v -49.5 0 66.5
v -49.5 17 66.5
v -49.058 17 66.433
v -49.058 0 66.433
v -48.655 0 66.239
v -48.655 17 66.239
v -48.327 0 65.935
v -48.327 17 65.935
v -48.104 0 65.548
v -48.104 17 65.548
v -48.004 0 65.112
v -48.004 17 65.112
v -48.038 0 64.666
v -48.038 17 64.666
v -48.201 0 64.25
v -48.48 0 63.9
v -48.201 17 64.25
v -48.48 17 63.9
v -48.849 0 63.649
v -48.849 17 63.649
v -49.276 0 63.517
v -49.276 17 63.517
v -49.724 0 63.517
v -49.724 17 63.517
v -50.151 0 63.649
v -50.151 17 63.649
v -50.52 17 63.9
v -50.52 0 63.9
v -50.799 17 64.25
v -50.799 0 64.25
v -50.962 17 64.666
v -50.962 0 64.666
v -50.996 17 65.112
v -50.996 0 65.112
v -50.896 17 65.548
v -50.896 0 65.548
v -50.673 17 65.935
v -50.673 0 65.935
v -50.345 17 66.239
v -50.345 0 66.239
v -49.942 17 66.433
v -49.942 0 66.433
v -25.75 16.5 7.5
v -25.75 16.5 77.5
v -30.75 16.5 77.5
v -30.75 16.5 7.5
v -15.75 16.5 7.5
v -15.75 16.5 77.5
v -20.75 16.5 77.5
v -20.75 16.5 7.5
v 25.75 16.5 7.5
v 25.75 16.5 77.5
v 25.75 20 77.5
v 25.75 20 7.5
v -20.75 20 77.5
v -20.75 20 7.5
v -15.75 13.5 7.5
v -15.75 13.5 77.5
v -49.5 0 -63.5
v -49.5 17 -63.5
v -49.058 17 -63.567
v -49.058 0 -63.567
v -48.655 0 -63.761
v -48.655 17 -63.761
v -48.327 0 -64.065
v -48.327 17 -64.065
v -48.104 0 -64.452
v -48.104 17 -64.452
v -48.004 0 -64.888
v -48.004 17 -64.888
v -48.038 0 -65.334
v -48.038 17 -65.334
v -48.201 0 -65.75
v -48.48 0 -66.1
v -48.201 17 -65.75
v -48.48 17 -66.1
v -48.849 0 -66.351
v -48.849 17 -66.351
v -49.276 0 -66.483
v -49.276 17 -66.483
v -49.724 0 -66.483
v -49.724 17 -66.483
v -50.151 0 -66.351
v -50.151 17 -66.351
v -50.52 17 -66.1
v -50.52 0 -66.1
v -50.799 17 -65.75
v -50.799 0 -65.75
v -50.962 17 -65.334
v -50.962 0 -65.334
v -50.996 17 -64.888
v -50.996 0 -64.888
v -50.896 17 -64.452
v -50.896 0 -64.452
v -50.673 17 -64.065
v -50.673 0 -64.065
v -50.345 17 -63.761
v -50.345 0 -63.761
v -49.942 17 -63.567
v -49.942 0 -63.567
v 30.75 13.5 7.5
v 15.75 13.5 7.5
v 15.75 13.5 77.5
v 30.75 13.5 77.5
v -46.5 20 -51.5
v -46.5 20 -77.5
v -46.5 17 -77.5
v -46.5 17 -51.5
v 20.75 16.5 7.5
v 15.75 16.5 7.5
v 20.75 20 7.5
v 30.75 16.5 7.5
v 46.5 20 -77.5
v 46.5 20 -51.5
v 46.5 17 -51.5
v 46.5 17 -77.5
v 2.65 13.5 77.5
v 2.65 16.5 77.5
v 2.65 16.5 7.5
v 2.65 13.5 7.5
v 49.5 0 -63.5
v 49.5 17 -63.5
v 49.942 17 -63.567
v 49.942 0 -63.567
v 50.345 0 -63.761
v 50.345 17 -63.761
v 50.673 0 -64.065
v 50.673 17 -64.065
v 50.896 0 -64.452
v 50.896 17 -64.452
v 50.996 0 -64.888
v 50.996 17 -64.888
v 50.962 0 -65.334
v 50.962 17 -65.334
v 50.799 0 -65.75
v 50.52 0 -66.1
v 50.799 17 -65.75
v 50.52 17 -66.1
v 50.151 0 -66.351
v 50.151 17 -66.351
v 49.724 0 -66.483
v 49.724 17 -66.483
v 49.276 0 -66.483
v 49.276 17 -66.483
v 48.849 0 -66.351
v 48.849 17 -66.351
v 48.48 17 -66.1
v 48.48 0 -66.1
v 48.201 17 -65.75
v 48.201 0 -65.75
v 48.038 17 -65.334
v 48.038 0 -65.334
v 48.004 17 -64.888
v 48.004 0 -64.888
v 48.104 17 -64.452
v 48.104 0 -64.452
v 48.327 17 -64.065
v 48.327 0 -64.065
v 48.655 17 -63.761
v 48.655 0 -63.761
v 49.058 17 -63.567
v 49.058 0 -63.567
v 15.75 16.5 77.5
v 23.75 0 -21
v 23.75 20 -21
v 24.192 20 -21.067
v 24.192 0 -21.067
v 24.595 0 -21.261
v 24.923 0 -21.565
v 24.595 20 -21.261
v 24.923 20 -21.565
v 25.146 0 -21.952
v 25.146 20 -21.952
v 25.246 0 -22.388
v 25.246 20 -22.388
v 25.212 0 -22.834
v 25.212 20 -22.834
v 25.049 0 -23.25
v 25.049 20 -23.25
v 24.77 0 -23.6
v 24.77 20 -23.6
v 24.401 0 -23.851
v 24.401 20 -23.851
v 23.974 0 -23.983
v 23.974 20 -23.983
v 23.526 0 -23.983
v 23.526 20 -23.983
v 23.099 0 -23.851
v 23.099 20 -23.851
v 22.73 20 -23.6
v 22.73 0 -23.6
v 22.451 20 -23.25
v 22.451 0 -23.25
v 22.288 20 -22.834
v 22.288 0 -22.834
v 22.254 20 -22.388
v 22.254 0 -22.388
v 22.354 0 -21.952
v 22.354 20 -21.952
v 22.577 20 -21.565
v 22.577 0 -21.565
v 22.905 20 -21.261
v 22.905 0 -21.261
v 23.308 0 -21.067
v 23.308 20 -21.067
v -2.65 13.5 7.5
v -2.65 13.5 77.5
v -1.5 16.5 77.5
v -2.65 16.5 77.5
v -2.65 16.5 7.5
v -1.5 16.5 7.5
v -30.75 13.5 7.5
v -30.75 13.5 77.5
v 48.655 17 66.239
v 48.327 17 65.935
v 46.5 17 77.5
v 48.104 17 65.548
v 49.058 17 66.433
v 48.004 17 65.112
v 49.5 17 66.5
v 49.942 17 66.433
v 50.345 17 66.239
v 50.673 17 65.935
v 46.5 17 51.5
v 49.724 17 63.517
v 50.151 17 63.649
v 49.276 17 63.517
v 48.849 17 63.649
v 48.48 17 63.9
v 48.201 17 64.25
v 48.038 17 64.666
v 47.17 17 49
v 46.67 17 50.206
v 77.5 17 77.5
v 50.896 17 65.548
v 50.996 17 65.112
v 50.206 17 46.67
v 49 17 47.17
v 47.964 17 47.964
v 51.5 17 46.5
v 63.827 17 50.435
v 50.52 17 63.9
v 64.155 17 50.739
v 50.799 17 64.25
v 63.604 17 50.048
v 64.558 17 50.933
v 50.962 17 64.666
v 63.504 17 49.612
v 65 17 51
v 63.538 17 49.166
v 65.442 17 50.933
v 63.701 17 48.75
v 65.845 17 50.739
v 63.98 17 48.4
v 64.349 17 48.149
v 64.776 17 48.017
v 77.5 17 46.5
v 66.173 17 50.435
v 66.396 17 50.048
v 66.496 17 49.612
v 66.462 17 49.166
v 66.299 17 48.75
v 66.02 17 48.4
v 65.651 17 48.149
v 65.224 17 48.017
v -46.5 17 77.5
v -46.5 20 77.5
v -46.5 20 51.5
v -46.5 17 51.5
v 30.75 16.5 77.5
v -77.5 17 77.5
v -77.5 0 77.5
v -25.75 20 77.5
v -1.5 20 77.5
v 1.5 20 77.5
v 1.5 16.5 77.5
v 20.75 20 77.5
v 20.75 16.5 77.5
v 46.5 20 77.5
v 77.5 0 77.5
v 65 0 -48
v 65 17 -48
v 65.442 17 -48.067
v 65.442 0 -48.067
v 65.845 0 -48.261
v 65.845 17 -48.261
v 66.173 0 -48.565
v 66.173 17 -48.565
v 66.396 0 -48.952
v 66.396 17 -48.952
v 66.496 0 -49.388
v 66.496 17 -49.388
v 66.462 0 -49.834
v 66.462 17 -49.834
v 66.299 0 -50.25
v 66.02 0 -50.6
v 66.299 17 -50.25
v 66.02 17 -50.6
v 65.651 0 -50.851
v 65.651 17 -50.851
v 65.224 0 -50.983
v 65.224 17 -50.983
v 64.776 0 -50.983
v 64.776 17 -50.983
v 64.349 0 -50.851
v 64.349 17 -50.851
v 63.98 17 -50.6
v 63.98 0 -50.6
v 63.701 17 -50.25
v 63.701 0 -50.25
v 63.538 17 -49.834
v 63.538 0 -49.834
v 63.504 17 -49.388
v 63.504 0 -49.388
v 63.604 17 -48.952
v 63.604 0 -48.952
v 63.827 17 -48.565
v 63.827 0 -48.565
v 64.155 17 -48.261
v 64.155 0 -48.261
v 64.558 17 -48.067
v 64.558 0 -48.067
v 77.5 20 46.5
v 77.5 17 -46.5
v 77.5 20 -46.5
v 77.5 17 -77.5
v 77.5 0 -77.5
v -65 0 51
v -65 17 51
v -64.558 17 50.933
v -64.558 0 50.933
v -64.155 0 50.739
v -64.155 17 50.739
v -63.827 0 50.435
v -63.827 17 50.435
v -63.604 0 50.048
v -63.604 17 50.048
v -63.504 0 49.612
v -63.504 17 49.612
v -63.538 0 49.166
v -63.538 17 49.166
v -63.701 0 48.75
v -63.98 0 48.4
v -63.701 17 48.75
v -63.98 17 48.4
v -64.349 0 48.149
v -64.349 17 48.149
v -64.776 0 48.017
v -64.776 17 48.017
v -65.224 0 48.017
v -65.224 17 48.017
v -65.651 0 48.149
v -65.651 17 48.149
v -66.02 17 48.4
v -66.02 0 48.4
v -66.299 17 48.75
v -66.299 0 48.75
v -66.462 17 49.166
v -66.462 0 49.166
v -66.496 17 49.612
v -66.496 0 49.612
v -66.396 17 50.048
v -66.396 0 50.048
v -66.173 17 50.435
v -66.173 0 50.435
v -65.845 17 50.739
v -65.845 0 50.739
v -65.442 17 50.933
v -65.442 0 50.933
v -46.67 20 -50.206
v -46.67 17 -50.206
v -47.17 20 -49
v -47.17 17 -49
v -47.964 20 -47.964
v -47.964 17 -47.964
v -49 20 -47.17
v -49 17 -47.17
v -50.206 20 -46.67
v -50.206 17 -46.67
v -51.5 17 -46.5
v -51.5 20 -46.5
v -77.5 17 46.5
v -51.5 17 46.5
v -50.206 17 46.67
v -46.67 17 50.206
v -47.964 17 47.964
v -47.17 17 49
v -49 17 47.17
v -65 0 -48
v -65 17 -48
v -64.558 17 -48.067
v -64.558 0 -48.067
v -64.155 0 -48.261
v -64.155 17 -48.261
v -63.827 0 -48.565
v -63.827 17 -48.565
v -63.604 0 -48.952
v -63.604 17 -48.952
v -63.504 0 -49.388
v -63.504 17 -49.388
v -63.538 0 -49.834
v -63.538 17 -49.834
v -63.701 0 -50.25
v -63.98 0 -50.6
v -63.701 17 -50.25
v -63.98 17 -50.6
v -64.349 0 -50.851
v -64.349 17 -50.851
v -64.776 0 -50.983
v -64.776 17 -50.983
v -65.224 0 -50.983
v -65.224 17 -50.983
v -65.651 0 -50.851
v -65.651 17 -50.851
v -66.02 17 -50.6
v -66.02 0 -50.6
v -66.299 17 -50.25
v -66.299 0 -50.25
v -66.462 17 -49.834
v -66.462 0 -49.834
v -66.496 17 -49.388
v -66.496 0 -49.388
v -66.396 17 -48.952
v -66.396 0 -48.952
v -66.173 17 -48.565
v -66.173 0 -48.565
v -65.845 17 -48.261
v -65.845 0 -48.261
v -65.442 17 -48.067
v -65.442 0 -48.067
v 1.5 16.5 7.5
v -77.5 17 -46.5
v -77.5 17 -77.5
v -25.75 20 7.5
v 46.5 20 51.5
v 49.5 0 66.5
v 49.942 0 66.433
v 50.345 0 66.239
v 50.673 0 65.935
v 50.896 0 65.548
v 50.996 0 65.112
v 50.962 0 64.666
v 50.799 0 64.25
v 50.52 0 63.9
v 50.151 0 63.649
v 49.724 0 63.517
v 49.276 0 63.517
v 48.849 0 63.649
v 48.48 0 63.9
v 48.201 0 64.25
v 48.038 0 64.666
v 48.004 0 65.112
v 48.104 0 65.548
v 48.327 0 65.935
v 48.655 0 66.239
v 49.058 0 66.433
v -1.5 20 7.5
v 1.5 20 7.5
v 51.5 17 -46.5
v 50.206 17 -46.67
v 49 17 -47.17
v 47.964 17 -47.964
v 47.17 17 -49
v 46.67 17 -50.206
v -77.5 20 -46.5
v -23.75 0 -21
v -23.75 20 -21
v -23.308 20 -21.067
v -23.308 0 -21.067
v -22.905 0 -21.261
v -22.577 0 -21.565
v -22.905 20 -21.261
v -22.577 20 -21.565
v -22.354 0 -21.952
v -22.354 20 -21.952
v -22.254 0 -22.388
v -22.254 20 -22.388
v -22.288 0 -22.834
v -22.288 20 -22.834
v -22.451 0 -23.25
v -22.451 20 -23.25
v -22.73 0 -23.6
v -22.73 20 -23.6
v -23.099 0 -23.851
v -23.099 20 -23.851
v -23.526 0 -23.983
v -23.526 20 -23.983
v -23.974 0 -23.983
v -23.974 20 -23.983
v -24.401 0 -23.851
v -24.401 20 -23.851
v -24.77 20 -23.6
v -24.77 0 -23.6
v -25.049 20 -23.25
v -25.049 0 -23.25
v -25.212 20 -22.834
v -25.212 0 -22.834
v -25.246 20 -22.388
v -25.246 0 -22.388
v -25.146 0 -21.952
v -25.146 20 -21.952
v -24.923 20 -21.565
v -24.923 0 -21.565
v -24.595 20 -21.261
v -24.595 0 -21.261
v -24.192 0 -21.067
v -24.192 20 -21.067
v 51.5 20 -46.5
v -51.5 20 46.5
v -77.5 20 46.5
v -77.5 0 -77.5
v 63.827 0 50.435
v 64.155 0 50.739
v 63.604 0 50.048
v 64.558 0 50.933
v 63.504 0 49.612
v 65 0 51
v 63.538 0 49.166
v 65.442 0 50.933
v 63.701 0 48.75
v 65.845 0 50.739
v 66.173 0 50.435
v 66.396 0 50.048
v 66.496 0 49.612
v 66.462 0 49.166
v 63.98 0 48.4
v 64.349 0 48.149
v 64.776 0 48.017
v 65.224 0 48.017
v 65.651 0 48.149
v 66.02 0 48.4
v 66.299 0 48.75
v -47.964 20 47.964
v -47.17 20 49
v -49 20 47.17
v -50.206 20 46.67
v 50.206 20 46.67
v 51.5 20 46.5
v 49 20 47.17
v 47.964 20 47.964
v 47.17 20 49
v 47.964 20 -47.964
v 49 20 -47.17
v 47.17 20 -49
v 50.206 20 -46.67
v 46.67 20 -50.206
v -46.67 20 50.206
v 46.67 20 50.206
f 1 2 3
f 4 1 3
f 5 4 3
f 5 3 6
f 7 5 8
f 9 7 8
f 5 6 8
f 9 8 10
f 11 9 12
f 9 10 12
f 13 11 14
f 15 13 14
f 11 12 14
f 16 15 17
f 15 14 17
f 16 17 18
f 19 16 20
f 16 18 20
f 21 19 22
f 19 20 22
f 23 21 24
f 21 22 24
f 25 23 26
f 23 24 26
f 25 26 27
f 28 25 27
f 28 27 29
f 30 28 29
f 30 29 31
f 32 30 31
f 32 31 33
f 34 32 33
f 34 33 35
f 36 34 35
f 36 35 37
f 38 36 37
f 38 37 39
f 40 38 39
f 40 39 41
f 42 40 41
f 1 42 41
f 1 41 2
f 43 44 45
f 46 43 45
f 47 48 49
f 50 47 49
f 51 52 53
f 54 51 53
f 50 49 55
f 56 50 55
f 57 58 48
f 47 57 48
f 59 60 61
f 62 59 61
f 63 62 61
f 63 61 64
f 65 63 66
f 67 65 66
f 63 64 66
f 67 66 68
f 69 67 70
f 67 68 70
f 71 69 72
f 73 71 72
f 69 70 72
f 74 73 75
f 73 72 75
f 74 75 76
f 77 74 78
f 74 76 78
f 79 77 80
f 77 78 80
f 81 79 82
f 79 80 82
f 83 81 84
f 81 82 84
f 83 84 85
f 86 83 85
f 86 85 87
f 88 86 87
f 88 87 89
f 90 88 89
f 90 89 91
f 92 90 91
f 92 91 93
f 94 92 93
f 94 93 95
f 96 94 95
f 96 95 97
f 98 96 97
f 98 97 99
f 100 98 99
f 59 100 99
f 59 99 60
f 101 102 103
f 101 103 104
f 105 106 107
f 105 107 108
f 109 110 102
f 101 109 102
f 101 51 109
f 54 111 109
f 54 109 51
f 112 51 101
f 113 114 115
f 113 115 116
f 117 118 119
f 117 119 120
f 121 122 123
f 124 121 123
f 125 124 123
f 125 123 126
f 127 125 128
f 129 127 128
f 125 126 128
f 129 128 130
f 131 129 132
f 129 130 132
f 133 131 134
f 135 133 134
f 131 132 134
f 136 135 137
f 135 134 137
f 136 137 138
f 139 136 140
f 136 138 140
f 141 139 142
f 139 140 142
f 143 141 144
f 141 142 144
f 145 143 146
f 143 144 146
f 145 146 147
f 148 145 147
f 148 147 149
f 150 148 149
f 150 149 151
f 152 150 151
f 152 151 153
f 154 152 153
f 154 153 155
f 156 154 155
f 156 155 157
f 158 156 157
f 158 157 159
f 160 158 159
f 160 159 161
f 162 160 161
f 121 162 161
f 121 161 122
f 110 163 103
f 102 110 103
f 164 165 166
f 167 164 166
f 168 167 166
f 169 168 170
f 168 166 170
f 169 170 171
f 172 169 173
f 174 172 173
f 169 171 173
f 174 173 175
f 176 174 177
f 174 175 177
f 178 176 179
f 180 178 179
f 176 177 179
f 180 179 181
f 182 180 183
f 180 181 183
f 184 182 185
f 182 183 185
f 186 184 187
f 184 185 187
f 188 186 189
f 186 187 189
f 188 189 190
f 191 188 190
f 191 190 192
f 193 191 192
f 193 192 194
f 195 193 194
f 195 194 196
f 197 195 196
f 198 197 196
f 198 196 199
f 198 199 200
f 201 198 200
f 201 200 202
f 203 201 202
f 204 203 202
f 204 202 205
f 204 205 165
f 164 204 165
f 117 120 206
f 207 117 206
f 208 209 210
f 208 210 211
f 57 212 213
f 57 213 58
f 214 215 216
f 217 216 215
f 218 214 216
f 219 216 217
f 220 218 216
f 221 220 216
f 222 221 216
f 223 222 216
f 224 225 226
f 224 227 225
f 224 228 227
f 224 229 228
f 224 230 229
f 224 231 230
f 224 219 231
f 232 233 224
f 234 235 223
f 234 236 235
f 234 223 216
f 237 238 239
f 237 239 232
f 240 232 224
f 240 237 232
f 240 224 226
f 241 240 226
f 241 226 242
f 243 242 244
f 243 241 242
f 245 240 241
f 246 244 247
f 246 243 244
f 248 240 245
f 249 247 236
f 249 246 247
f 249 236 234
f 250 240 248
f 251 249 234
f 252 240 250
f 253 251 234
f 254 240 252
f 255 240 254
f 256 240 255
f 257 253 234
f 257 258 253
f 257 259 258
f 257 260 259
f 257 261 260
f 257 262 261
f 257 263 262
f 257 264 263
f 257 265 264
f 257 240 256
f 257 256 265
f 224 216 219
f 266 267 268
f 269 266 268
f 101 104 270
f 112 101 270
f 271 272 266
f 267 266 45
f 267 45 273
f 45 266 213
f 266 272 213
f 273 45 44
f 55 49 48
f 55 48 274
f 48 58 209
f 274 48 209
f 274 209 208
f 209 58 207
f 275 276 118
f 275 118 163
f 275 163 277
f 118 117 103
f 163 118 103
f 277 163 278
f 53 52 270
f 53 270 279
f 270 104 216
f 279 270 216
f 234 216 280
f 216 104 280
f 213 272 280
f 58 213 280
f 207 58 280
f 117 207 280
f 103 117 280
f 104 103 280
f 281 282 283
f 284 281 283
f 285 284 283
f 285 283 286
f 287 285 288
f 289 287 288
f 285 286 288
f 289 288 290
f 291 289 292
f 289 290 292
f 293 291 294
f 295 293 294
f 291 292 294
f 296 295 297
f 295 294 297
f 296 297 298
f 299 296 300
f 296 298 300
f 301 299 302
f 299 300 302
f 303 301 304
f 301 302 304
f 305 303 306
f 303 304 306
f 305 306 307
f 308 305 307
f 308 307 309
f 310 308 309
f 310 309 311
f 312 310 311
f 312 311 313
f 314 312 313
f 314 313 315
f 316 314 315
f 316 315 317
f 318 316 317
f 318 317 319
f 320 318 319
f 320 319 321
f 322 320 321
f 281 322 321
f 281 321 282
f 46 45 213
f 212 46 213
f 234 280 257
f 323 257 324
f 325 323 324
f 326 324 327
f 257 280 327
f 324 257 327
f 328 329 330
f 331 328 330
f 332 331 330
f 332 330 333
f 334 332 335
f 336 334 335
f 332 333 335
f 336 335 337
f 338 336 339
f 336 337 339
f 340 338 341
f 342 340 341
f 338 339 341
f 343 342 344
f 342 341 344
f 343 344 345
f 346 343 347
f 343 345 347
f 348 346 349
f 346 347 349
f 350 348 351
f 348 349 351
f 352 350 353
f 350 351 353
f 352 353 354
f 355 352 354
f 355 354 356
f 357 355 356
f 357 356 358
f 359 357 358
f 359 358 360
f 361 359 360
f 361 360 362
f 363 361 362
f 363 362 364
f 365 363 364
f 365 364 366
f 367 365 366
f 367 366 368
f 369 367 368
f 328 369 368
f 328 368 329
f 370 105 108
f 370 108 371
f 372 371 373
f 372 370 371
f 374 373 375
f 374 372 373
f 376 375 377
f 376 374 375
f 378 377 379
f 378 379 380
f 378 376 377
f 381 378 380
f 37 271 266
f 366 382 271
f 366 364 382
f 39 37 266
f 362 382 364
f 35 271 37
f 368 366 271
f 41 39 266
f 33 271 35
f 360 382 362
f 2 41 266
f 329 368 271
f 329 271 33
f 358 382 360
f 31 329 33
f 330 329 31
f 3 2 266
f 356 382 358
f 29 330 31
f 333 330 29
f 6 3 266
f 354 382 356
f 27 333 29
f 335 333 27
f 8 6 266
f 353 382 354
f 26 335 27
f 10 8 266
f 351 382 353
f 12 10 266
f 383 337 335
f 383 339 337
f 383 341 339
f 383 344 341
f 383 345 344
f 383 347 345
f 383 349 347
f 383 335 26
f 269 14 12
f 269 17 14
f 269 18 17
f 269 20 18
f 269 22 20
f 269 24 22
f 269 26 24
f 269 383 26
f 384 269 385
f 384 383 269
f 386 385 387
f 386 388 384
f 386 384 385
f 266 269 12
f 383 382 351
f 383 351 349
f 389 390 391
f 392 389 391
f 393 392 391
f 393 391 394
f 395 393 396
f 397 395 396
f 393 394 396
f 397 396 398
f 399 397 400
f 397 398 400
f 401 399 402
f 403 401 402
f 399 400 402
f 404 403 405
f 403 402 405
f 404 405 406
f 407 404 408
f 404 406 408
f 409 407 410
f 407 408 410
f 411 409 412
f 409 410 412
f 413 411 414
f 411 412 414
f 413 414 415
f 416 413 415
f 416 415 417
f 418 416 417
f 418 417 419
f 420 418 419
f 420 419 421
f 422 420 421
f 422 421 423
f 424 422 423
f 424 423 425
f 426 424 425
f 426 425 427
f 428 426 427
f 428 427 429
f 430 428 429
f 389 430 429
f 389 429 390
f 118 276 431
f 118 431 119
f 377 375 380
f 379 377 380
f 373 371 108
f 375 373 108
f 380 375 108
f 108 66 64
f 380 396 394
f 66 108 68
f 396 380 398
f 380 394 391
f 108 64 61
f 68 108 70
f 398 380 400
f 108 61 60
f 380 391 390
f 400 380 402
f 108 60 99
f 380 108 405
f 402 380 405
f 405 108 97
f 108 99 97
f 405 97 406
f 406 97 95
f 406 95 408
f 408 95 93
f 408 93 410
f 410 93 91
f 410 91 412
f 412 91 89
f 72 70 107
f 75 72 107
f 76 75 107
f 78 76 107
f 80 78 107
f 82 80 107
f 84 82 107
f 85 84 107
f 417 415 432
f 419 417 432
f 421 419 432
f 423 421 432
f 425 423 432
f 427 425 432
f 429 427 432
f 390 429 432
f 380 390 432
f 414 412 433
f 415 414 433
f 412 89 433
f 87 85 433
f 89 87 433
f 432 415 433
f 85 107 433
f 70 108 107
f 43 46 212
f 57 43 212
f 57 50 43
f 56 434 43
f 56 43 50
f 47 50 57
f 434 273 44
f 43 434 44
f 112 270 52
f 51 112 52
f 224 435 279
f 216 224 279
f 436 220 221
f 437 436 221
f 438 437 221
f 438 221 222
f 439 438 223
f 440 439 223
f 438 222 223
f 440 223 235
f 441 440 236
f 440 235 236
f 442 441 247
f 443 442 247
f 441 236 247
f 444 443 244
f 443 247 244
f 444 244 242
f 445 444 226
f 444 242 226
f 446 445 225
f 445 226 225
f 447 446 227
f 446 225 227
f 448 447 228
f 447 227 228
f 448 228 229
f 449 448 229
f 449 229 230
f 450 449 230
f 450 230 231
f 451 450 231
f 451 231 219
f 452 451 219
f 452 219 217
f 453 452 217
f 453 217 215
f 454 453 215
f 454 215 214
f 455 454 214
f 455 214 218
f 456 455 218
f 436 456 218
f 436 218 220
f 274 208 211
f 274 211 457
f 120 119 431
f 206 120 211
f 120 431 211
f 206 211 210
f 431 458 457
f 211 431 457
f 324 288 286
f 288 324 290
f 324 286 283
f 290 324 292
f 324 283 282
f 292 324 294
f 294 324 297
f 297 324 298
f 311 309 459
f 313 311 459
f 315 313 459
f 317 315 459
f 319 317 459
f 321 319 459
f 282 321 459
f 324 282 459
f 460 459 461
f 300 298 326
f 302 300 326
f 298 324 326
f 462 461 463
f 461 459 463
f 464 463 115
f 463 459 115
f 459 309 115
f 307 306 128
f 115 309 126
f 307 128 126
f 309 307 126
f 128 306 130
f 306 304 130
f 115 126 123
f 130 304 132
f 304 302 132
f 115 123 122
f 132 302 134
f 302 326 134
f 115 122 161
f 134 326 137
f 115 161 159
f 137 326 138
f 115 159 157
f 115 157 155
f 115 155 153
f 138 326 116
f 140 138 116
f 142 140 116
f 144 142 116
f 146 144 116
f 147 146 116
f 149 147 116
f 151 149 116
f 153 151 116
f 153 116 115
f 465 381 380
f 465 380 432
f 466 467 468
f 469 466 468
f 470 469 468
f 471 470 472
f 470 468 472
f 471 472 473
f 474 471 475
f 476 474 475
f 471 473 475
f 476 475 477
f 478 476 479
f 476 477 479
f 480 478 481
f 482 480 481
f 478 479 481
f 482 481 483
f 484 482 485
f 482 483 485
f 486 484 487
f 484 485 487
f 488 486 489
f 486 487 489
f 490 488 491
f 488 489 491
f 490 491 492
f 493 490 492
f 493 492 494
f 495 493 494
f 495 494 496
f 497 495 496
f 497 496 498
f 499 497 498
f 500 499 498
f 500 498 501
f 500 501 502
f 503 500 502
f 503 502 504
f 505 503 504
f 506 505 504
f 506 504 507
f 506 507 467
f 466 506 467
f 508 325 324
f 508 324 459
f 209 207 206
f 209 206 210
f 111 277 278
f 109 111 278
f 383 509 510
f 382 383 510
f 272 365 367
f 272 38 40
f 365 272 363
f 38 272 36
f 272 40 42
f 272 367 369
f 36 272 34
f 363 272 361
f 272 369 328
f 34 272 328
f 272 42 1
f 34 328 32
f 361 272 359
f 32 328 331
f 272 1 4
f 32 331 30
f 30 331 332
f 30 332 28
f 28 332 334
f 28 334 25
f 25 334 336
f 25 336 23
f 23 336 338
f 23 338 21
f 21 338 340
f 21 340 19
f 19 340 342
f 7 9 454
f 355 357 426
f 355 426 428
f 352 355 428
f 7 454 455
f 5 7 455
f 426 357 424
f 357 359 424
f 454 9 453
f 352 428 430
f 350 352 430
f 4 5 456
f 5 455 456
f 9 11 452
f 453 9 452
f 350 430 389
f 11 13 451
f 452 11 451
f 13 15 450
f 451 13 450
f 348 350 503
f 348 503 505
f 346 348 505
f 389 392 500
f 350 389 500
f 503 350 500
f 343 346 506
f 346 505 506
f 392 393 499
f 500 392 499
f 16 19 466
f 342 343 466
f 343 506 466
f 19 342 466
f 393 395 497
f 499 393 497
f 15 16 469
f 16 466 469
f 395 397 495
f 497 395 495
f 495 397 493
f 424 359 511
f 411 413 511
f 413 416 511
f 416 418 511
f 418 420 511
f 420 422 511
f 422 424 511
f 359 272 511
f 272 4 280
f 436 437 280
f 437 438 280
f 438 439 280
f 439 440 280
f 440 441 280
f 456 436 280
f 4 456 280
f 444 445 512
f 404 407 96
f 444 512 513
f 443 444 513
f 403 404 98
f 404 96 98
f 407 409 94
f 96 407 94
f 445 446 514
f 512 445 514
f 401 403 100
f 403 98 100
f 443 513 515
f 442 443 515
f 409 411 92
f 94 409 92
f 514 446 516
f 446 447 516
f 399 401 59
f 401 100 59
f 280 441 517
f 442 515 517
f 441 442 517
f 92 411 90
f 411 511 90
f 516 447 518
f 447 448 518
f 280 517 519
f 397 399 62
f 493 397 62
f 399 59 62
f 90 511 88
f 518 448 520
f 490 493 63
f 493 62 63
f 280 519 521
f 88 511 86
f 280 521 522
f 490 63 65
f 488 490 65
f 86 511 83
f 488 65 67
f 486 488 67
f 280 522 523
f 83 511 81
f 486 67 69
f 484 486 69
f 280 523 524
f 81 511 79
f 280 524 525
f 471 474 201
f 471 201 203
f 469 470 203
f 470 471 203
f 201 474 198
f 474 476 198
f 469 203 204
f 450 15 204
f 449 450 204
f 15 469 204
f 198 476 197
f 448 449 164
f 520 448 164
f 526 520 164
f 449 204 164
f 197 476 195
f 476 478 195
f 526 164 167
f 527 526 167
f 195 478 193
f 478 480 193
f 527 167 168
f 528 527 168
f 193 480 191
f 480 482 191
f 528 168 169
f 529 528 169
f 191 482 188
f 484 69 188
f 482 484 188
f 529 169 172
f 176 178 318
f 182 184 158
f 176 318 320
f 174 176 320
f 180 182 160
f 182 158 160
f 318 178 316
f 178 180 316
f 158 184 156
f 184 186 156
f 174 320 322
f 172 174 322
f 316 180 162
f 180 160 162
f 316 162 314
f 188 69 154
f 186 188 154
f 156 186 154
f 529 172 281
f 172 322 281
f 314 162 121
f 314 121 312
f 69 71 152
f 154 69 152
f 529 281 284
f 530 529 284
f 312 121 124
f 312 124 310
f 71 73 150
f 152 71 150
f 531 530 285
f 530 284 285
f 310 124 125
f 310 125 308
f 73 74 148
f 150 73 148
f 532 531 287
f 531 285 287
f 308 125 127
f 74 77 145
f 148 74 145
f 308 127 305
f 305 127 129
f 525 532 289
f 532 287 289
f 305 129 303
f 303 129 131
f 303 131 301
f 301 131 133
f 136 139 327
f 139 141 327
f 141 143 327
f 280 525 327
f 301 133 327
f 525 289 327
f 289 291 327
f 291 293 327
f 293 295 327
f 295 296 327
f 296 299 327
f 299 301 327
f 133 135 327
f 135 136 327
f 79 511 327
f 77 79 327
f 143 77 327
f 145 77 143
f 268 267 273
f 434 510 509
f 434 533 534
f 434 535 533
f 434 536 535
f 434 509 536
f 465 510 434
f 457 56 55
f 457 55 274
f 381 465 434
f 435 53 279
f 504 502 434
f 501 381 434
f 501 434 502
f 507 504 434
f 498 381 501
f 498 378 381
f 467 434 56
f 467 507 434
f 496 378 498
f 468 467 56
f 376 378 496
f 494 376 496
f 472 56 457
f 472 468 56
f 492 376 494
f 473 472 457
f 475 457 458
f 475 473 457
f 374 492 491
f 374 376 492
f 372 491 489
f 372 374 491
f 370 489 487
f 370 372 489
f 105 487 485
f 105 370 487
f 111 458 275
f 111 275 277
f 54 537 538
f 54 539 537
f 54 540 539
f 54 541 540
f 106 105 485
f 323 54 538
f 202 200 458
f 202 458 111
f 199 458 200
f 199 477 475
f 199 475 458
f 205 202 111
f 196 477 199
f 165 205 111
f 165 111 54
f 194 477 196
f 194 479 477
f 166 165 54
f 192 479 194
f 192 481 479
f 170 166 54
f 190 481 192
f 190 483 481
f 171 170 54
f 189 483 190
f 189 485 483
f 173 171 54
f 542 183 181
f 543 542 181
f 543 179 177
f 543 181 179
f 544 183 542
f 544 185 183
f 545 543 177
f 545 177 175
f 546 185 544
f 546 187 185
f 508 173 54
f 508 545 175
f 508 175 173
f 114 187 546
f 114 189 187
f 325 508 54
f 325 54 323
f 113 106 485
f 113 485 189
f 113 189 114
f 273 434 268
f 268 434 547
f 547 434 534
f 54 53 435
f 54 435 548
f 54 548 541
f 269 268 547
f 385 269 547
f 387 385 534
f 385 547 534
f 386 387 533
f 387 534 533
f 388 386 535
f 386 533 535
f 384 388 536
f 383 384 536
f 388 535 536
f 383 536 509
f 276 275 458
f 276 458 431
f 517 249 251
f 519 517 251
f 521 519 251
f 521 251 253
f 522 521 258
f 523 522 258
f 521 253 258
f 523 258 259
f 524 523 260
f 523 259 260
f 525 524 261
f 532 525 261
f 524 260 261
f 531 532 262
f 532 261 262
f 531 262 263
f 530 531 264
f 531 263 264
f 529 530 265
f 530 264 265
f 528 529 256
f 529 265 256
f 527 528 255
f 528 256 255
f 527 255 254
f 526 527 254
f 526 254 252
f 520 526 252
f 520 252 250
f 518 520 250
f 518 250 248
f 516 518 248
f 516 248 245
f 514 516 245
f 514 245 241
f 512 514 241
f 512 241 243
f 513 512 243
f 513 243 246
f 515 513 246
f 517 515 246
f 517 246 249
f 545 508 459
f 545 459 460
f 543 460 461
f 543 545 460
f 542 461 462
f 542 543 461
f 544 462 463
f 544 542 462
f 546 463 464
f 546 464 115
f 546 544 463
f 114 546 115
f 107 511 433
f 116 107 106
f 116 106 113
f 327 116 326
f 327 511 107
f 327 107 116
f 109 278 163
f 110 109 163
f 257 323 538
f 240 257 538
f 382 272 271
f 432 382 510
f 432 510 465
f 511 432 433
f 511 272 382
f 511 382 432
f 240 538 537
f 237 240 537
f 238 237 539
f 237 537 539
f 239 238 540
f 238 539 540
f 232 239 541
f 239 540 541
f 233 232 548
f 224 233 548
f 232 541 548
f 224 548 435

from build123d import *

# Parameters (mm, degrees)
SKETCH1_W           = 155
SKETCH1_H           = 155
BOSS_EXTRUDE2_DEPTH = 20
CUT_EXTRUDE6_DEPTH  = 3
CUT_EXTRUDE7_REACH  = 112.912
SKETCH8_R           = 1.5
CUT_EXTRUDE8_DEPTH  = 70
CUT_EXTRUDE9_REACH  = 113.411
SKETCH10_R          = 1.5


with BuildPart() as part:
    # Sketch1 → Boss-Extrude2 (new body)
    with BuildSketch(Plane(origin=(0, 0, 0), x_dir=(1, 0, 0), z_dir=(0, 1, 0))):
        Rectangle(SKETCH1_W, SKETCH1_H)
    extrude(amount=BOSS_EXTRUDE2_DEPTH)

    # Sketch7 → Cut-Extrude6 (cut)
    with BuildSketch(Plane(origin=(0, 20, 0), x_dir=(1, 0, 0), z_dir=(0, 1, 0))):
        with BuildLine():
            Line((-77.5, 77.5), (-46.5, 77.5))
            Line((-46.5, 77.5), (-46.5, 51.5))
            ThreePointArc((-46.5, 51.5), (-47.964466094, 47.964466094), (-51.5, 46.5))
            Line((-51.5, 46.5), (-77.5, 46.5))
            Line((-77.5, 46.5), (-77.5, 77.5))
        make_face()
        with BuildLine():
            Line((77.5, 46.5), (51.5, 46.5))
            ThreePointArc((51.5, 46.5), (47.964466094, 47.964466094), (46.5, 51.5))
            Line((46.5, 51.5), (46.5, 77.5))
            Line((46.5, 77.5), (77.5, 77.5))
            Line((77.5, 77.5), (77.5, 46.5))
        make_face()
        with BuildLine():
            Line((77.5, -77.5), (77.5, -46.5))
            Line((77.5, -46.5), (51.5, -46.5))
            ThreePointArc((51.5, -46.5), (47.964466094, -47.964466094), (46.5, -51.5))
            Line((46.5, -51.5), (46.5, -77.5))
            Line((46.5, -77.5), (77.5, -77.5))
        make_face()
        with BuildLine():
            Line((-46.5, -77.5), (-46.5, -51.5))
            ThreePointArc((-46.5, -51.5), (-47.964466094, -47.964466094), (-51.5, -46.5))
            Line((-51.5, -46.5), (-77.5, -46.5))
            Line((-77.5, -46.5), (-77.5, -77.5))
            Line((-77.5, -77.5), (-46.5, -77.5))
        make_face()
    extrude(amount=-CUT_EXTRUDE6_DEPTH, mode=Mode.SUBTRACT)

    # Sketch8 → Cut-Extrude7 (cut, up to next)
    with BuildSketch(Plane(origin=(0, 17, 0), x_dir=(1, 0, 0), z_dir=(0, 1, 0)), mode=Mode.PRIVATE) as cut_extrude7_sk1:
        with Locations(Location((-65, -49.5, 0), (0, 0, 270))):
            Circle(SKETCH8_R)
    cut_extrude7_tool1 = extrude(cut_extrude7_sk1.sketch, amount=-CUT_EXTRUDE7_REACH, mode=Mode.PRIVATE) & part.part
    # Sketch8 → Cut-Extrude7 (cut, up to next)
    with BuildSketch(Plane(origin=(0, 17, 0), x_dir=(1, 0, 0), z_dir=(0, 1, 0)), mode=Mode.PRIVATE) as cut_extrude7_sk2:
        with Locations(Location((-49.5, -65, 0), (0, 0, 270))):
            Circle(SKETCH8_R)
    cut_extrude7_tool2 = extrude(cut_extrude7_sk2.sketch, amount=-CUT_EXTRUDE7_REACH, mode=Mode.PRIVATE) & part.part
    # Sketch8 → Cut-Extrude7 (cut, up to next)
    with BuildSketch(Plane(origin=(0, 17, 0), x_dir=(1, 0, 0), z_dir=(0, 1, 0)), mode=Mode.PRIVATE) as cut_extrude7_sk3:
        with Locations(Location((49.5, -65, 0), (0, 0, 270))):
            Circle(SKETCH8_R)
    cut_extrude7_tool3 = extrude(cut_extrude7_sk3.sketch, amount=-CUT_EXTRUDE7_REACH, mode=Mode.PRIVATE) & part.part
    # Sketch8 → Cut-Extrude7 (cut, up to next)
    with BuildSketch(Plane(origin=(0, 17, 0), x_dir=(1, 0, 0), z_dir=(0, 1, 0)), mode=Mode.PRIVATE) as cut_extrude7_sk4:
        with Locations(Location((65, -49.5, 0), (0, 0, 270))):
            Circle(SKETCH8_R)
    cut_extrude7_tool4 = extrude(cut_extrude7_sk4.sketch, amount=-CUT_EXTRUDE7_REACH, mode=Mode.PRIVATE) & part.part
    # Sketch8 → Cut-Extrude7 (cut, up to next)
    with BuildSketch(Plane(origin=(0, 17, 0), x_dir=(1, 0, 0), z_dir=(0, 1, 0)), mode=Mode.PRIVATE) as cut_extrude7_sk5:
        with Locations(Location((49.5, 65, 0), (0, 0, 270))):
            Circle(SKETCH8_R)
    cut_extrude7_tool5 = extrude(cut_extrude7_sk5.sketch, amount=-CUT_EXTRUDE7_REACH, mode=Mode.PRIVATE) & part.part
    # Sketch8 → Cut-Extrude7 (cut, up to next)
    with BuildSketch(Plane(origin=(0, 17, 0), x_dir=(1, 0, 0), z_dir=(0, 1, 0)), mode=Mode.PRIVATE) as cut_extrude7_sk6:
        with Locations(Location((65, 49.5, 0), (0, 0, 270))):
            Circle(SKETCH8_R)
    cut_extrude7_tool6 = extrude(cut_extrude7_sk6.sketch, amount=-CUT_EXTRUDE7_REACH, mode=Mode.PRIVATE) & part.part
    # Sketch8 → Cut-Extrude7 (cut, up to next)
    with BuildSketch(Plane(origin=(0, 17, 0), x_dir=(1, 0, 0), z_dir=(0, 1, 0)), mode=Mode.PRIVATE) as cut_extrude7_sk7:
        with Locations(Location((-49.5, 65, 0), (0, 0, 270))):
            Circle(SKETCH8_R)
    cut_extrude7_tool7 = extrude(cut_extrude7_sk7.sketch, amount=-CUT_EXTRUDE7_REACH, mode=Mode.PRIVATE) & part.part
    # Sketch8 → Cut-Extrude7 (cut, up to next)
    with BuildSketch(Plane(origin=(0, 17, 0), x_dir=(1, 0, 0), z_dir=(0, 1, 0)), mode=Mode.PRIVATE) as cut_extrude7_sk8:
        with Locations(Location((-65, 49.5, 0), (0, 0, 270))):
            Circle(SKETCH8_R)
    cut_extrude7_tool8 = extrude(cut_extrude7_sk8.sketch, amount=-CUT_EXTRUDE7_REACH, mode=Mode.PRIVATE) & part.part
    add(cut_extrude7_tool1.solids().sort_by_distance((-65, 17, 49.5))[0], mode=Mode.SUBTRACT)
    add(cut_extrude7_tool2.solids().sort_by_distance((-49.5, 17, 65))[0], mode=Mode.SUBTRACT)
    add(cut_extrude7_tool3.solids().sort_by_distance((49.5, 17, 65))[0], mode=Mode.SUBTRACT)
    add(cut_extrude7_tool4.solids().sort_by_distance((65, 17, 49.5))[0], mode=Mode.SUBTRACT)
    add(cut_extrude7_tool5.solids().sort_by_distance((49.5, 17, -65))[0], mode=Mode.SUBTRACT)
    add(cut_extrude7_tool6.solids().sort_by_distance((65, 17, -49.5))[0], mode=Mode.SUBTRACT)
    add(cut_extrude7_tool7.solids().sort_by_distance((-49.5, 17, -65))[0], mode=Mode.SUBTRACT)
    add(cut_extrude7_tool8.solids().sort_by_distance((-65, 17, -49.5))[0], mode=Mode.SUBTRACT)

    # Sketch9 → Cut-Extrude8 (cut)
    with BuildSketch(Plane.XY.offset(77.5)):
        Polygon((-20.75, 20), (-25.75, 20), (-25.75, 16.5), (-30.75, 16.5), (-30.75, 13.5), (-15.75, 13.5), (-15.75, 16.5), (-20.75, 16.5), align=None)
        Polygon((25.75, 16.5), (25.75, 20), (20.75, 20), (20.75, 16.5), (15.75, 16.5), (15.75, 13.5), (30.75, 13.5), (30.75, 16.5), align=None)
        Polygon((-2.65, 16.5), (-1.5, 16.5), (-1.5, 20), (1.5, 20), (1.5, 16.5), (2.65, 16.5), (2.65, 13.5), (-2.65, 13.5), align=None)
    extrude(amount=-CUT_EXTRUDE8_DEPTH, mode=Mode.SUBTRACT)

    # Sketch10 → Cut-Extrude9 (cut, up to next)
    with BuildSketch(Plane(origin=(0, 20, 0), x_dir=(1, 0, 0), z_dir=(0, 1, 0)), mode=Mode.PRIVATE) as cut_extrude9_sk1:
        with Locations(Location((-23.75, 22.5, 0), (0, 0, 270))):
            Circle(SKETCH10_R)
    cut_extrude9_tool1 = extrude(cut_extrude9_sk1.sketch, amount=-CUT_EXTRUDE9_REACH, mode=Mode.PRIVATE) & part.part
    # Sketch10 → Cut-Extrude9 (cut, up to next)
    with BuildSketch(Plane(origin=(0, 20, 0), x_dir=(1, 0, 0), z_dir=(0, 1, 0)), mode=Mode.PRIVATE) as cut_extrude9_sk2:
        with Locations(Location((23.75, 22.5, 0), (0, 0, 270))):
            Circle(SKETCH10_R)
    cut_extrude9_tool2 = extrude(cut_extrude9_sk2.sketch, amount=-CUT_EXTRUDE9_REACH, mode=Mode.PRIVATE) & part.part
    add(cut_extrude9_tool1.solids().sort_by_distance((-23.75, 20, -22.5))[0], mode=Mode.SUBTRACT)
    add(cut_extrude9_tool2.solids().sort_by_distance((23.75, 20, -22.5))[0], mode=Mode.SUBTRACT)


solid = part.part
